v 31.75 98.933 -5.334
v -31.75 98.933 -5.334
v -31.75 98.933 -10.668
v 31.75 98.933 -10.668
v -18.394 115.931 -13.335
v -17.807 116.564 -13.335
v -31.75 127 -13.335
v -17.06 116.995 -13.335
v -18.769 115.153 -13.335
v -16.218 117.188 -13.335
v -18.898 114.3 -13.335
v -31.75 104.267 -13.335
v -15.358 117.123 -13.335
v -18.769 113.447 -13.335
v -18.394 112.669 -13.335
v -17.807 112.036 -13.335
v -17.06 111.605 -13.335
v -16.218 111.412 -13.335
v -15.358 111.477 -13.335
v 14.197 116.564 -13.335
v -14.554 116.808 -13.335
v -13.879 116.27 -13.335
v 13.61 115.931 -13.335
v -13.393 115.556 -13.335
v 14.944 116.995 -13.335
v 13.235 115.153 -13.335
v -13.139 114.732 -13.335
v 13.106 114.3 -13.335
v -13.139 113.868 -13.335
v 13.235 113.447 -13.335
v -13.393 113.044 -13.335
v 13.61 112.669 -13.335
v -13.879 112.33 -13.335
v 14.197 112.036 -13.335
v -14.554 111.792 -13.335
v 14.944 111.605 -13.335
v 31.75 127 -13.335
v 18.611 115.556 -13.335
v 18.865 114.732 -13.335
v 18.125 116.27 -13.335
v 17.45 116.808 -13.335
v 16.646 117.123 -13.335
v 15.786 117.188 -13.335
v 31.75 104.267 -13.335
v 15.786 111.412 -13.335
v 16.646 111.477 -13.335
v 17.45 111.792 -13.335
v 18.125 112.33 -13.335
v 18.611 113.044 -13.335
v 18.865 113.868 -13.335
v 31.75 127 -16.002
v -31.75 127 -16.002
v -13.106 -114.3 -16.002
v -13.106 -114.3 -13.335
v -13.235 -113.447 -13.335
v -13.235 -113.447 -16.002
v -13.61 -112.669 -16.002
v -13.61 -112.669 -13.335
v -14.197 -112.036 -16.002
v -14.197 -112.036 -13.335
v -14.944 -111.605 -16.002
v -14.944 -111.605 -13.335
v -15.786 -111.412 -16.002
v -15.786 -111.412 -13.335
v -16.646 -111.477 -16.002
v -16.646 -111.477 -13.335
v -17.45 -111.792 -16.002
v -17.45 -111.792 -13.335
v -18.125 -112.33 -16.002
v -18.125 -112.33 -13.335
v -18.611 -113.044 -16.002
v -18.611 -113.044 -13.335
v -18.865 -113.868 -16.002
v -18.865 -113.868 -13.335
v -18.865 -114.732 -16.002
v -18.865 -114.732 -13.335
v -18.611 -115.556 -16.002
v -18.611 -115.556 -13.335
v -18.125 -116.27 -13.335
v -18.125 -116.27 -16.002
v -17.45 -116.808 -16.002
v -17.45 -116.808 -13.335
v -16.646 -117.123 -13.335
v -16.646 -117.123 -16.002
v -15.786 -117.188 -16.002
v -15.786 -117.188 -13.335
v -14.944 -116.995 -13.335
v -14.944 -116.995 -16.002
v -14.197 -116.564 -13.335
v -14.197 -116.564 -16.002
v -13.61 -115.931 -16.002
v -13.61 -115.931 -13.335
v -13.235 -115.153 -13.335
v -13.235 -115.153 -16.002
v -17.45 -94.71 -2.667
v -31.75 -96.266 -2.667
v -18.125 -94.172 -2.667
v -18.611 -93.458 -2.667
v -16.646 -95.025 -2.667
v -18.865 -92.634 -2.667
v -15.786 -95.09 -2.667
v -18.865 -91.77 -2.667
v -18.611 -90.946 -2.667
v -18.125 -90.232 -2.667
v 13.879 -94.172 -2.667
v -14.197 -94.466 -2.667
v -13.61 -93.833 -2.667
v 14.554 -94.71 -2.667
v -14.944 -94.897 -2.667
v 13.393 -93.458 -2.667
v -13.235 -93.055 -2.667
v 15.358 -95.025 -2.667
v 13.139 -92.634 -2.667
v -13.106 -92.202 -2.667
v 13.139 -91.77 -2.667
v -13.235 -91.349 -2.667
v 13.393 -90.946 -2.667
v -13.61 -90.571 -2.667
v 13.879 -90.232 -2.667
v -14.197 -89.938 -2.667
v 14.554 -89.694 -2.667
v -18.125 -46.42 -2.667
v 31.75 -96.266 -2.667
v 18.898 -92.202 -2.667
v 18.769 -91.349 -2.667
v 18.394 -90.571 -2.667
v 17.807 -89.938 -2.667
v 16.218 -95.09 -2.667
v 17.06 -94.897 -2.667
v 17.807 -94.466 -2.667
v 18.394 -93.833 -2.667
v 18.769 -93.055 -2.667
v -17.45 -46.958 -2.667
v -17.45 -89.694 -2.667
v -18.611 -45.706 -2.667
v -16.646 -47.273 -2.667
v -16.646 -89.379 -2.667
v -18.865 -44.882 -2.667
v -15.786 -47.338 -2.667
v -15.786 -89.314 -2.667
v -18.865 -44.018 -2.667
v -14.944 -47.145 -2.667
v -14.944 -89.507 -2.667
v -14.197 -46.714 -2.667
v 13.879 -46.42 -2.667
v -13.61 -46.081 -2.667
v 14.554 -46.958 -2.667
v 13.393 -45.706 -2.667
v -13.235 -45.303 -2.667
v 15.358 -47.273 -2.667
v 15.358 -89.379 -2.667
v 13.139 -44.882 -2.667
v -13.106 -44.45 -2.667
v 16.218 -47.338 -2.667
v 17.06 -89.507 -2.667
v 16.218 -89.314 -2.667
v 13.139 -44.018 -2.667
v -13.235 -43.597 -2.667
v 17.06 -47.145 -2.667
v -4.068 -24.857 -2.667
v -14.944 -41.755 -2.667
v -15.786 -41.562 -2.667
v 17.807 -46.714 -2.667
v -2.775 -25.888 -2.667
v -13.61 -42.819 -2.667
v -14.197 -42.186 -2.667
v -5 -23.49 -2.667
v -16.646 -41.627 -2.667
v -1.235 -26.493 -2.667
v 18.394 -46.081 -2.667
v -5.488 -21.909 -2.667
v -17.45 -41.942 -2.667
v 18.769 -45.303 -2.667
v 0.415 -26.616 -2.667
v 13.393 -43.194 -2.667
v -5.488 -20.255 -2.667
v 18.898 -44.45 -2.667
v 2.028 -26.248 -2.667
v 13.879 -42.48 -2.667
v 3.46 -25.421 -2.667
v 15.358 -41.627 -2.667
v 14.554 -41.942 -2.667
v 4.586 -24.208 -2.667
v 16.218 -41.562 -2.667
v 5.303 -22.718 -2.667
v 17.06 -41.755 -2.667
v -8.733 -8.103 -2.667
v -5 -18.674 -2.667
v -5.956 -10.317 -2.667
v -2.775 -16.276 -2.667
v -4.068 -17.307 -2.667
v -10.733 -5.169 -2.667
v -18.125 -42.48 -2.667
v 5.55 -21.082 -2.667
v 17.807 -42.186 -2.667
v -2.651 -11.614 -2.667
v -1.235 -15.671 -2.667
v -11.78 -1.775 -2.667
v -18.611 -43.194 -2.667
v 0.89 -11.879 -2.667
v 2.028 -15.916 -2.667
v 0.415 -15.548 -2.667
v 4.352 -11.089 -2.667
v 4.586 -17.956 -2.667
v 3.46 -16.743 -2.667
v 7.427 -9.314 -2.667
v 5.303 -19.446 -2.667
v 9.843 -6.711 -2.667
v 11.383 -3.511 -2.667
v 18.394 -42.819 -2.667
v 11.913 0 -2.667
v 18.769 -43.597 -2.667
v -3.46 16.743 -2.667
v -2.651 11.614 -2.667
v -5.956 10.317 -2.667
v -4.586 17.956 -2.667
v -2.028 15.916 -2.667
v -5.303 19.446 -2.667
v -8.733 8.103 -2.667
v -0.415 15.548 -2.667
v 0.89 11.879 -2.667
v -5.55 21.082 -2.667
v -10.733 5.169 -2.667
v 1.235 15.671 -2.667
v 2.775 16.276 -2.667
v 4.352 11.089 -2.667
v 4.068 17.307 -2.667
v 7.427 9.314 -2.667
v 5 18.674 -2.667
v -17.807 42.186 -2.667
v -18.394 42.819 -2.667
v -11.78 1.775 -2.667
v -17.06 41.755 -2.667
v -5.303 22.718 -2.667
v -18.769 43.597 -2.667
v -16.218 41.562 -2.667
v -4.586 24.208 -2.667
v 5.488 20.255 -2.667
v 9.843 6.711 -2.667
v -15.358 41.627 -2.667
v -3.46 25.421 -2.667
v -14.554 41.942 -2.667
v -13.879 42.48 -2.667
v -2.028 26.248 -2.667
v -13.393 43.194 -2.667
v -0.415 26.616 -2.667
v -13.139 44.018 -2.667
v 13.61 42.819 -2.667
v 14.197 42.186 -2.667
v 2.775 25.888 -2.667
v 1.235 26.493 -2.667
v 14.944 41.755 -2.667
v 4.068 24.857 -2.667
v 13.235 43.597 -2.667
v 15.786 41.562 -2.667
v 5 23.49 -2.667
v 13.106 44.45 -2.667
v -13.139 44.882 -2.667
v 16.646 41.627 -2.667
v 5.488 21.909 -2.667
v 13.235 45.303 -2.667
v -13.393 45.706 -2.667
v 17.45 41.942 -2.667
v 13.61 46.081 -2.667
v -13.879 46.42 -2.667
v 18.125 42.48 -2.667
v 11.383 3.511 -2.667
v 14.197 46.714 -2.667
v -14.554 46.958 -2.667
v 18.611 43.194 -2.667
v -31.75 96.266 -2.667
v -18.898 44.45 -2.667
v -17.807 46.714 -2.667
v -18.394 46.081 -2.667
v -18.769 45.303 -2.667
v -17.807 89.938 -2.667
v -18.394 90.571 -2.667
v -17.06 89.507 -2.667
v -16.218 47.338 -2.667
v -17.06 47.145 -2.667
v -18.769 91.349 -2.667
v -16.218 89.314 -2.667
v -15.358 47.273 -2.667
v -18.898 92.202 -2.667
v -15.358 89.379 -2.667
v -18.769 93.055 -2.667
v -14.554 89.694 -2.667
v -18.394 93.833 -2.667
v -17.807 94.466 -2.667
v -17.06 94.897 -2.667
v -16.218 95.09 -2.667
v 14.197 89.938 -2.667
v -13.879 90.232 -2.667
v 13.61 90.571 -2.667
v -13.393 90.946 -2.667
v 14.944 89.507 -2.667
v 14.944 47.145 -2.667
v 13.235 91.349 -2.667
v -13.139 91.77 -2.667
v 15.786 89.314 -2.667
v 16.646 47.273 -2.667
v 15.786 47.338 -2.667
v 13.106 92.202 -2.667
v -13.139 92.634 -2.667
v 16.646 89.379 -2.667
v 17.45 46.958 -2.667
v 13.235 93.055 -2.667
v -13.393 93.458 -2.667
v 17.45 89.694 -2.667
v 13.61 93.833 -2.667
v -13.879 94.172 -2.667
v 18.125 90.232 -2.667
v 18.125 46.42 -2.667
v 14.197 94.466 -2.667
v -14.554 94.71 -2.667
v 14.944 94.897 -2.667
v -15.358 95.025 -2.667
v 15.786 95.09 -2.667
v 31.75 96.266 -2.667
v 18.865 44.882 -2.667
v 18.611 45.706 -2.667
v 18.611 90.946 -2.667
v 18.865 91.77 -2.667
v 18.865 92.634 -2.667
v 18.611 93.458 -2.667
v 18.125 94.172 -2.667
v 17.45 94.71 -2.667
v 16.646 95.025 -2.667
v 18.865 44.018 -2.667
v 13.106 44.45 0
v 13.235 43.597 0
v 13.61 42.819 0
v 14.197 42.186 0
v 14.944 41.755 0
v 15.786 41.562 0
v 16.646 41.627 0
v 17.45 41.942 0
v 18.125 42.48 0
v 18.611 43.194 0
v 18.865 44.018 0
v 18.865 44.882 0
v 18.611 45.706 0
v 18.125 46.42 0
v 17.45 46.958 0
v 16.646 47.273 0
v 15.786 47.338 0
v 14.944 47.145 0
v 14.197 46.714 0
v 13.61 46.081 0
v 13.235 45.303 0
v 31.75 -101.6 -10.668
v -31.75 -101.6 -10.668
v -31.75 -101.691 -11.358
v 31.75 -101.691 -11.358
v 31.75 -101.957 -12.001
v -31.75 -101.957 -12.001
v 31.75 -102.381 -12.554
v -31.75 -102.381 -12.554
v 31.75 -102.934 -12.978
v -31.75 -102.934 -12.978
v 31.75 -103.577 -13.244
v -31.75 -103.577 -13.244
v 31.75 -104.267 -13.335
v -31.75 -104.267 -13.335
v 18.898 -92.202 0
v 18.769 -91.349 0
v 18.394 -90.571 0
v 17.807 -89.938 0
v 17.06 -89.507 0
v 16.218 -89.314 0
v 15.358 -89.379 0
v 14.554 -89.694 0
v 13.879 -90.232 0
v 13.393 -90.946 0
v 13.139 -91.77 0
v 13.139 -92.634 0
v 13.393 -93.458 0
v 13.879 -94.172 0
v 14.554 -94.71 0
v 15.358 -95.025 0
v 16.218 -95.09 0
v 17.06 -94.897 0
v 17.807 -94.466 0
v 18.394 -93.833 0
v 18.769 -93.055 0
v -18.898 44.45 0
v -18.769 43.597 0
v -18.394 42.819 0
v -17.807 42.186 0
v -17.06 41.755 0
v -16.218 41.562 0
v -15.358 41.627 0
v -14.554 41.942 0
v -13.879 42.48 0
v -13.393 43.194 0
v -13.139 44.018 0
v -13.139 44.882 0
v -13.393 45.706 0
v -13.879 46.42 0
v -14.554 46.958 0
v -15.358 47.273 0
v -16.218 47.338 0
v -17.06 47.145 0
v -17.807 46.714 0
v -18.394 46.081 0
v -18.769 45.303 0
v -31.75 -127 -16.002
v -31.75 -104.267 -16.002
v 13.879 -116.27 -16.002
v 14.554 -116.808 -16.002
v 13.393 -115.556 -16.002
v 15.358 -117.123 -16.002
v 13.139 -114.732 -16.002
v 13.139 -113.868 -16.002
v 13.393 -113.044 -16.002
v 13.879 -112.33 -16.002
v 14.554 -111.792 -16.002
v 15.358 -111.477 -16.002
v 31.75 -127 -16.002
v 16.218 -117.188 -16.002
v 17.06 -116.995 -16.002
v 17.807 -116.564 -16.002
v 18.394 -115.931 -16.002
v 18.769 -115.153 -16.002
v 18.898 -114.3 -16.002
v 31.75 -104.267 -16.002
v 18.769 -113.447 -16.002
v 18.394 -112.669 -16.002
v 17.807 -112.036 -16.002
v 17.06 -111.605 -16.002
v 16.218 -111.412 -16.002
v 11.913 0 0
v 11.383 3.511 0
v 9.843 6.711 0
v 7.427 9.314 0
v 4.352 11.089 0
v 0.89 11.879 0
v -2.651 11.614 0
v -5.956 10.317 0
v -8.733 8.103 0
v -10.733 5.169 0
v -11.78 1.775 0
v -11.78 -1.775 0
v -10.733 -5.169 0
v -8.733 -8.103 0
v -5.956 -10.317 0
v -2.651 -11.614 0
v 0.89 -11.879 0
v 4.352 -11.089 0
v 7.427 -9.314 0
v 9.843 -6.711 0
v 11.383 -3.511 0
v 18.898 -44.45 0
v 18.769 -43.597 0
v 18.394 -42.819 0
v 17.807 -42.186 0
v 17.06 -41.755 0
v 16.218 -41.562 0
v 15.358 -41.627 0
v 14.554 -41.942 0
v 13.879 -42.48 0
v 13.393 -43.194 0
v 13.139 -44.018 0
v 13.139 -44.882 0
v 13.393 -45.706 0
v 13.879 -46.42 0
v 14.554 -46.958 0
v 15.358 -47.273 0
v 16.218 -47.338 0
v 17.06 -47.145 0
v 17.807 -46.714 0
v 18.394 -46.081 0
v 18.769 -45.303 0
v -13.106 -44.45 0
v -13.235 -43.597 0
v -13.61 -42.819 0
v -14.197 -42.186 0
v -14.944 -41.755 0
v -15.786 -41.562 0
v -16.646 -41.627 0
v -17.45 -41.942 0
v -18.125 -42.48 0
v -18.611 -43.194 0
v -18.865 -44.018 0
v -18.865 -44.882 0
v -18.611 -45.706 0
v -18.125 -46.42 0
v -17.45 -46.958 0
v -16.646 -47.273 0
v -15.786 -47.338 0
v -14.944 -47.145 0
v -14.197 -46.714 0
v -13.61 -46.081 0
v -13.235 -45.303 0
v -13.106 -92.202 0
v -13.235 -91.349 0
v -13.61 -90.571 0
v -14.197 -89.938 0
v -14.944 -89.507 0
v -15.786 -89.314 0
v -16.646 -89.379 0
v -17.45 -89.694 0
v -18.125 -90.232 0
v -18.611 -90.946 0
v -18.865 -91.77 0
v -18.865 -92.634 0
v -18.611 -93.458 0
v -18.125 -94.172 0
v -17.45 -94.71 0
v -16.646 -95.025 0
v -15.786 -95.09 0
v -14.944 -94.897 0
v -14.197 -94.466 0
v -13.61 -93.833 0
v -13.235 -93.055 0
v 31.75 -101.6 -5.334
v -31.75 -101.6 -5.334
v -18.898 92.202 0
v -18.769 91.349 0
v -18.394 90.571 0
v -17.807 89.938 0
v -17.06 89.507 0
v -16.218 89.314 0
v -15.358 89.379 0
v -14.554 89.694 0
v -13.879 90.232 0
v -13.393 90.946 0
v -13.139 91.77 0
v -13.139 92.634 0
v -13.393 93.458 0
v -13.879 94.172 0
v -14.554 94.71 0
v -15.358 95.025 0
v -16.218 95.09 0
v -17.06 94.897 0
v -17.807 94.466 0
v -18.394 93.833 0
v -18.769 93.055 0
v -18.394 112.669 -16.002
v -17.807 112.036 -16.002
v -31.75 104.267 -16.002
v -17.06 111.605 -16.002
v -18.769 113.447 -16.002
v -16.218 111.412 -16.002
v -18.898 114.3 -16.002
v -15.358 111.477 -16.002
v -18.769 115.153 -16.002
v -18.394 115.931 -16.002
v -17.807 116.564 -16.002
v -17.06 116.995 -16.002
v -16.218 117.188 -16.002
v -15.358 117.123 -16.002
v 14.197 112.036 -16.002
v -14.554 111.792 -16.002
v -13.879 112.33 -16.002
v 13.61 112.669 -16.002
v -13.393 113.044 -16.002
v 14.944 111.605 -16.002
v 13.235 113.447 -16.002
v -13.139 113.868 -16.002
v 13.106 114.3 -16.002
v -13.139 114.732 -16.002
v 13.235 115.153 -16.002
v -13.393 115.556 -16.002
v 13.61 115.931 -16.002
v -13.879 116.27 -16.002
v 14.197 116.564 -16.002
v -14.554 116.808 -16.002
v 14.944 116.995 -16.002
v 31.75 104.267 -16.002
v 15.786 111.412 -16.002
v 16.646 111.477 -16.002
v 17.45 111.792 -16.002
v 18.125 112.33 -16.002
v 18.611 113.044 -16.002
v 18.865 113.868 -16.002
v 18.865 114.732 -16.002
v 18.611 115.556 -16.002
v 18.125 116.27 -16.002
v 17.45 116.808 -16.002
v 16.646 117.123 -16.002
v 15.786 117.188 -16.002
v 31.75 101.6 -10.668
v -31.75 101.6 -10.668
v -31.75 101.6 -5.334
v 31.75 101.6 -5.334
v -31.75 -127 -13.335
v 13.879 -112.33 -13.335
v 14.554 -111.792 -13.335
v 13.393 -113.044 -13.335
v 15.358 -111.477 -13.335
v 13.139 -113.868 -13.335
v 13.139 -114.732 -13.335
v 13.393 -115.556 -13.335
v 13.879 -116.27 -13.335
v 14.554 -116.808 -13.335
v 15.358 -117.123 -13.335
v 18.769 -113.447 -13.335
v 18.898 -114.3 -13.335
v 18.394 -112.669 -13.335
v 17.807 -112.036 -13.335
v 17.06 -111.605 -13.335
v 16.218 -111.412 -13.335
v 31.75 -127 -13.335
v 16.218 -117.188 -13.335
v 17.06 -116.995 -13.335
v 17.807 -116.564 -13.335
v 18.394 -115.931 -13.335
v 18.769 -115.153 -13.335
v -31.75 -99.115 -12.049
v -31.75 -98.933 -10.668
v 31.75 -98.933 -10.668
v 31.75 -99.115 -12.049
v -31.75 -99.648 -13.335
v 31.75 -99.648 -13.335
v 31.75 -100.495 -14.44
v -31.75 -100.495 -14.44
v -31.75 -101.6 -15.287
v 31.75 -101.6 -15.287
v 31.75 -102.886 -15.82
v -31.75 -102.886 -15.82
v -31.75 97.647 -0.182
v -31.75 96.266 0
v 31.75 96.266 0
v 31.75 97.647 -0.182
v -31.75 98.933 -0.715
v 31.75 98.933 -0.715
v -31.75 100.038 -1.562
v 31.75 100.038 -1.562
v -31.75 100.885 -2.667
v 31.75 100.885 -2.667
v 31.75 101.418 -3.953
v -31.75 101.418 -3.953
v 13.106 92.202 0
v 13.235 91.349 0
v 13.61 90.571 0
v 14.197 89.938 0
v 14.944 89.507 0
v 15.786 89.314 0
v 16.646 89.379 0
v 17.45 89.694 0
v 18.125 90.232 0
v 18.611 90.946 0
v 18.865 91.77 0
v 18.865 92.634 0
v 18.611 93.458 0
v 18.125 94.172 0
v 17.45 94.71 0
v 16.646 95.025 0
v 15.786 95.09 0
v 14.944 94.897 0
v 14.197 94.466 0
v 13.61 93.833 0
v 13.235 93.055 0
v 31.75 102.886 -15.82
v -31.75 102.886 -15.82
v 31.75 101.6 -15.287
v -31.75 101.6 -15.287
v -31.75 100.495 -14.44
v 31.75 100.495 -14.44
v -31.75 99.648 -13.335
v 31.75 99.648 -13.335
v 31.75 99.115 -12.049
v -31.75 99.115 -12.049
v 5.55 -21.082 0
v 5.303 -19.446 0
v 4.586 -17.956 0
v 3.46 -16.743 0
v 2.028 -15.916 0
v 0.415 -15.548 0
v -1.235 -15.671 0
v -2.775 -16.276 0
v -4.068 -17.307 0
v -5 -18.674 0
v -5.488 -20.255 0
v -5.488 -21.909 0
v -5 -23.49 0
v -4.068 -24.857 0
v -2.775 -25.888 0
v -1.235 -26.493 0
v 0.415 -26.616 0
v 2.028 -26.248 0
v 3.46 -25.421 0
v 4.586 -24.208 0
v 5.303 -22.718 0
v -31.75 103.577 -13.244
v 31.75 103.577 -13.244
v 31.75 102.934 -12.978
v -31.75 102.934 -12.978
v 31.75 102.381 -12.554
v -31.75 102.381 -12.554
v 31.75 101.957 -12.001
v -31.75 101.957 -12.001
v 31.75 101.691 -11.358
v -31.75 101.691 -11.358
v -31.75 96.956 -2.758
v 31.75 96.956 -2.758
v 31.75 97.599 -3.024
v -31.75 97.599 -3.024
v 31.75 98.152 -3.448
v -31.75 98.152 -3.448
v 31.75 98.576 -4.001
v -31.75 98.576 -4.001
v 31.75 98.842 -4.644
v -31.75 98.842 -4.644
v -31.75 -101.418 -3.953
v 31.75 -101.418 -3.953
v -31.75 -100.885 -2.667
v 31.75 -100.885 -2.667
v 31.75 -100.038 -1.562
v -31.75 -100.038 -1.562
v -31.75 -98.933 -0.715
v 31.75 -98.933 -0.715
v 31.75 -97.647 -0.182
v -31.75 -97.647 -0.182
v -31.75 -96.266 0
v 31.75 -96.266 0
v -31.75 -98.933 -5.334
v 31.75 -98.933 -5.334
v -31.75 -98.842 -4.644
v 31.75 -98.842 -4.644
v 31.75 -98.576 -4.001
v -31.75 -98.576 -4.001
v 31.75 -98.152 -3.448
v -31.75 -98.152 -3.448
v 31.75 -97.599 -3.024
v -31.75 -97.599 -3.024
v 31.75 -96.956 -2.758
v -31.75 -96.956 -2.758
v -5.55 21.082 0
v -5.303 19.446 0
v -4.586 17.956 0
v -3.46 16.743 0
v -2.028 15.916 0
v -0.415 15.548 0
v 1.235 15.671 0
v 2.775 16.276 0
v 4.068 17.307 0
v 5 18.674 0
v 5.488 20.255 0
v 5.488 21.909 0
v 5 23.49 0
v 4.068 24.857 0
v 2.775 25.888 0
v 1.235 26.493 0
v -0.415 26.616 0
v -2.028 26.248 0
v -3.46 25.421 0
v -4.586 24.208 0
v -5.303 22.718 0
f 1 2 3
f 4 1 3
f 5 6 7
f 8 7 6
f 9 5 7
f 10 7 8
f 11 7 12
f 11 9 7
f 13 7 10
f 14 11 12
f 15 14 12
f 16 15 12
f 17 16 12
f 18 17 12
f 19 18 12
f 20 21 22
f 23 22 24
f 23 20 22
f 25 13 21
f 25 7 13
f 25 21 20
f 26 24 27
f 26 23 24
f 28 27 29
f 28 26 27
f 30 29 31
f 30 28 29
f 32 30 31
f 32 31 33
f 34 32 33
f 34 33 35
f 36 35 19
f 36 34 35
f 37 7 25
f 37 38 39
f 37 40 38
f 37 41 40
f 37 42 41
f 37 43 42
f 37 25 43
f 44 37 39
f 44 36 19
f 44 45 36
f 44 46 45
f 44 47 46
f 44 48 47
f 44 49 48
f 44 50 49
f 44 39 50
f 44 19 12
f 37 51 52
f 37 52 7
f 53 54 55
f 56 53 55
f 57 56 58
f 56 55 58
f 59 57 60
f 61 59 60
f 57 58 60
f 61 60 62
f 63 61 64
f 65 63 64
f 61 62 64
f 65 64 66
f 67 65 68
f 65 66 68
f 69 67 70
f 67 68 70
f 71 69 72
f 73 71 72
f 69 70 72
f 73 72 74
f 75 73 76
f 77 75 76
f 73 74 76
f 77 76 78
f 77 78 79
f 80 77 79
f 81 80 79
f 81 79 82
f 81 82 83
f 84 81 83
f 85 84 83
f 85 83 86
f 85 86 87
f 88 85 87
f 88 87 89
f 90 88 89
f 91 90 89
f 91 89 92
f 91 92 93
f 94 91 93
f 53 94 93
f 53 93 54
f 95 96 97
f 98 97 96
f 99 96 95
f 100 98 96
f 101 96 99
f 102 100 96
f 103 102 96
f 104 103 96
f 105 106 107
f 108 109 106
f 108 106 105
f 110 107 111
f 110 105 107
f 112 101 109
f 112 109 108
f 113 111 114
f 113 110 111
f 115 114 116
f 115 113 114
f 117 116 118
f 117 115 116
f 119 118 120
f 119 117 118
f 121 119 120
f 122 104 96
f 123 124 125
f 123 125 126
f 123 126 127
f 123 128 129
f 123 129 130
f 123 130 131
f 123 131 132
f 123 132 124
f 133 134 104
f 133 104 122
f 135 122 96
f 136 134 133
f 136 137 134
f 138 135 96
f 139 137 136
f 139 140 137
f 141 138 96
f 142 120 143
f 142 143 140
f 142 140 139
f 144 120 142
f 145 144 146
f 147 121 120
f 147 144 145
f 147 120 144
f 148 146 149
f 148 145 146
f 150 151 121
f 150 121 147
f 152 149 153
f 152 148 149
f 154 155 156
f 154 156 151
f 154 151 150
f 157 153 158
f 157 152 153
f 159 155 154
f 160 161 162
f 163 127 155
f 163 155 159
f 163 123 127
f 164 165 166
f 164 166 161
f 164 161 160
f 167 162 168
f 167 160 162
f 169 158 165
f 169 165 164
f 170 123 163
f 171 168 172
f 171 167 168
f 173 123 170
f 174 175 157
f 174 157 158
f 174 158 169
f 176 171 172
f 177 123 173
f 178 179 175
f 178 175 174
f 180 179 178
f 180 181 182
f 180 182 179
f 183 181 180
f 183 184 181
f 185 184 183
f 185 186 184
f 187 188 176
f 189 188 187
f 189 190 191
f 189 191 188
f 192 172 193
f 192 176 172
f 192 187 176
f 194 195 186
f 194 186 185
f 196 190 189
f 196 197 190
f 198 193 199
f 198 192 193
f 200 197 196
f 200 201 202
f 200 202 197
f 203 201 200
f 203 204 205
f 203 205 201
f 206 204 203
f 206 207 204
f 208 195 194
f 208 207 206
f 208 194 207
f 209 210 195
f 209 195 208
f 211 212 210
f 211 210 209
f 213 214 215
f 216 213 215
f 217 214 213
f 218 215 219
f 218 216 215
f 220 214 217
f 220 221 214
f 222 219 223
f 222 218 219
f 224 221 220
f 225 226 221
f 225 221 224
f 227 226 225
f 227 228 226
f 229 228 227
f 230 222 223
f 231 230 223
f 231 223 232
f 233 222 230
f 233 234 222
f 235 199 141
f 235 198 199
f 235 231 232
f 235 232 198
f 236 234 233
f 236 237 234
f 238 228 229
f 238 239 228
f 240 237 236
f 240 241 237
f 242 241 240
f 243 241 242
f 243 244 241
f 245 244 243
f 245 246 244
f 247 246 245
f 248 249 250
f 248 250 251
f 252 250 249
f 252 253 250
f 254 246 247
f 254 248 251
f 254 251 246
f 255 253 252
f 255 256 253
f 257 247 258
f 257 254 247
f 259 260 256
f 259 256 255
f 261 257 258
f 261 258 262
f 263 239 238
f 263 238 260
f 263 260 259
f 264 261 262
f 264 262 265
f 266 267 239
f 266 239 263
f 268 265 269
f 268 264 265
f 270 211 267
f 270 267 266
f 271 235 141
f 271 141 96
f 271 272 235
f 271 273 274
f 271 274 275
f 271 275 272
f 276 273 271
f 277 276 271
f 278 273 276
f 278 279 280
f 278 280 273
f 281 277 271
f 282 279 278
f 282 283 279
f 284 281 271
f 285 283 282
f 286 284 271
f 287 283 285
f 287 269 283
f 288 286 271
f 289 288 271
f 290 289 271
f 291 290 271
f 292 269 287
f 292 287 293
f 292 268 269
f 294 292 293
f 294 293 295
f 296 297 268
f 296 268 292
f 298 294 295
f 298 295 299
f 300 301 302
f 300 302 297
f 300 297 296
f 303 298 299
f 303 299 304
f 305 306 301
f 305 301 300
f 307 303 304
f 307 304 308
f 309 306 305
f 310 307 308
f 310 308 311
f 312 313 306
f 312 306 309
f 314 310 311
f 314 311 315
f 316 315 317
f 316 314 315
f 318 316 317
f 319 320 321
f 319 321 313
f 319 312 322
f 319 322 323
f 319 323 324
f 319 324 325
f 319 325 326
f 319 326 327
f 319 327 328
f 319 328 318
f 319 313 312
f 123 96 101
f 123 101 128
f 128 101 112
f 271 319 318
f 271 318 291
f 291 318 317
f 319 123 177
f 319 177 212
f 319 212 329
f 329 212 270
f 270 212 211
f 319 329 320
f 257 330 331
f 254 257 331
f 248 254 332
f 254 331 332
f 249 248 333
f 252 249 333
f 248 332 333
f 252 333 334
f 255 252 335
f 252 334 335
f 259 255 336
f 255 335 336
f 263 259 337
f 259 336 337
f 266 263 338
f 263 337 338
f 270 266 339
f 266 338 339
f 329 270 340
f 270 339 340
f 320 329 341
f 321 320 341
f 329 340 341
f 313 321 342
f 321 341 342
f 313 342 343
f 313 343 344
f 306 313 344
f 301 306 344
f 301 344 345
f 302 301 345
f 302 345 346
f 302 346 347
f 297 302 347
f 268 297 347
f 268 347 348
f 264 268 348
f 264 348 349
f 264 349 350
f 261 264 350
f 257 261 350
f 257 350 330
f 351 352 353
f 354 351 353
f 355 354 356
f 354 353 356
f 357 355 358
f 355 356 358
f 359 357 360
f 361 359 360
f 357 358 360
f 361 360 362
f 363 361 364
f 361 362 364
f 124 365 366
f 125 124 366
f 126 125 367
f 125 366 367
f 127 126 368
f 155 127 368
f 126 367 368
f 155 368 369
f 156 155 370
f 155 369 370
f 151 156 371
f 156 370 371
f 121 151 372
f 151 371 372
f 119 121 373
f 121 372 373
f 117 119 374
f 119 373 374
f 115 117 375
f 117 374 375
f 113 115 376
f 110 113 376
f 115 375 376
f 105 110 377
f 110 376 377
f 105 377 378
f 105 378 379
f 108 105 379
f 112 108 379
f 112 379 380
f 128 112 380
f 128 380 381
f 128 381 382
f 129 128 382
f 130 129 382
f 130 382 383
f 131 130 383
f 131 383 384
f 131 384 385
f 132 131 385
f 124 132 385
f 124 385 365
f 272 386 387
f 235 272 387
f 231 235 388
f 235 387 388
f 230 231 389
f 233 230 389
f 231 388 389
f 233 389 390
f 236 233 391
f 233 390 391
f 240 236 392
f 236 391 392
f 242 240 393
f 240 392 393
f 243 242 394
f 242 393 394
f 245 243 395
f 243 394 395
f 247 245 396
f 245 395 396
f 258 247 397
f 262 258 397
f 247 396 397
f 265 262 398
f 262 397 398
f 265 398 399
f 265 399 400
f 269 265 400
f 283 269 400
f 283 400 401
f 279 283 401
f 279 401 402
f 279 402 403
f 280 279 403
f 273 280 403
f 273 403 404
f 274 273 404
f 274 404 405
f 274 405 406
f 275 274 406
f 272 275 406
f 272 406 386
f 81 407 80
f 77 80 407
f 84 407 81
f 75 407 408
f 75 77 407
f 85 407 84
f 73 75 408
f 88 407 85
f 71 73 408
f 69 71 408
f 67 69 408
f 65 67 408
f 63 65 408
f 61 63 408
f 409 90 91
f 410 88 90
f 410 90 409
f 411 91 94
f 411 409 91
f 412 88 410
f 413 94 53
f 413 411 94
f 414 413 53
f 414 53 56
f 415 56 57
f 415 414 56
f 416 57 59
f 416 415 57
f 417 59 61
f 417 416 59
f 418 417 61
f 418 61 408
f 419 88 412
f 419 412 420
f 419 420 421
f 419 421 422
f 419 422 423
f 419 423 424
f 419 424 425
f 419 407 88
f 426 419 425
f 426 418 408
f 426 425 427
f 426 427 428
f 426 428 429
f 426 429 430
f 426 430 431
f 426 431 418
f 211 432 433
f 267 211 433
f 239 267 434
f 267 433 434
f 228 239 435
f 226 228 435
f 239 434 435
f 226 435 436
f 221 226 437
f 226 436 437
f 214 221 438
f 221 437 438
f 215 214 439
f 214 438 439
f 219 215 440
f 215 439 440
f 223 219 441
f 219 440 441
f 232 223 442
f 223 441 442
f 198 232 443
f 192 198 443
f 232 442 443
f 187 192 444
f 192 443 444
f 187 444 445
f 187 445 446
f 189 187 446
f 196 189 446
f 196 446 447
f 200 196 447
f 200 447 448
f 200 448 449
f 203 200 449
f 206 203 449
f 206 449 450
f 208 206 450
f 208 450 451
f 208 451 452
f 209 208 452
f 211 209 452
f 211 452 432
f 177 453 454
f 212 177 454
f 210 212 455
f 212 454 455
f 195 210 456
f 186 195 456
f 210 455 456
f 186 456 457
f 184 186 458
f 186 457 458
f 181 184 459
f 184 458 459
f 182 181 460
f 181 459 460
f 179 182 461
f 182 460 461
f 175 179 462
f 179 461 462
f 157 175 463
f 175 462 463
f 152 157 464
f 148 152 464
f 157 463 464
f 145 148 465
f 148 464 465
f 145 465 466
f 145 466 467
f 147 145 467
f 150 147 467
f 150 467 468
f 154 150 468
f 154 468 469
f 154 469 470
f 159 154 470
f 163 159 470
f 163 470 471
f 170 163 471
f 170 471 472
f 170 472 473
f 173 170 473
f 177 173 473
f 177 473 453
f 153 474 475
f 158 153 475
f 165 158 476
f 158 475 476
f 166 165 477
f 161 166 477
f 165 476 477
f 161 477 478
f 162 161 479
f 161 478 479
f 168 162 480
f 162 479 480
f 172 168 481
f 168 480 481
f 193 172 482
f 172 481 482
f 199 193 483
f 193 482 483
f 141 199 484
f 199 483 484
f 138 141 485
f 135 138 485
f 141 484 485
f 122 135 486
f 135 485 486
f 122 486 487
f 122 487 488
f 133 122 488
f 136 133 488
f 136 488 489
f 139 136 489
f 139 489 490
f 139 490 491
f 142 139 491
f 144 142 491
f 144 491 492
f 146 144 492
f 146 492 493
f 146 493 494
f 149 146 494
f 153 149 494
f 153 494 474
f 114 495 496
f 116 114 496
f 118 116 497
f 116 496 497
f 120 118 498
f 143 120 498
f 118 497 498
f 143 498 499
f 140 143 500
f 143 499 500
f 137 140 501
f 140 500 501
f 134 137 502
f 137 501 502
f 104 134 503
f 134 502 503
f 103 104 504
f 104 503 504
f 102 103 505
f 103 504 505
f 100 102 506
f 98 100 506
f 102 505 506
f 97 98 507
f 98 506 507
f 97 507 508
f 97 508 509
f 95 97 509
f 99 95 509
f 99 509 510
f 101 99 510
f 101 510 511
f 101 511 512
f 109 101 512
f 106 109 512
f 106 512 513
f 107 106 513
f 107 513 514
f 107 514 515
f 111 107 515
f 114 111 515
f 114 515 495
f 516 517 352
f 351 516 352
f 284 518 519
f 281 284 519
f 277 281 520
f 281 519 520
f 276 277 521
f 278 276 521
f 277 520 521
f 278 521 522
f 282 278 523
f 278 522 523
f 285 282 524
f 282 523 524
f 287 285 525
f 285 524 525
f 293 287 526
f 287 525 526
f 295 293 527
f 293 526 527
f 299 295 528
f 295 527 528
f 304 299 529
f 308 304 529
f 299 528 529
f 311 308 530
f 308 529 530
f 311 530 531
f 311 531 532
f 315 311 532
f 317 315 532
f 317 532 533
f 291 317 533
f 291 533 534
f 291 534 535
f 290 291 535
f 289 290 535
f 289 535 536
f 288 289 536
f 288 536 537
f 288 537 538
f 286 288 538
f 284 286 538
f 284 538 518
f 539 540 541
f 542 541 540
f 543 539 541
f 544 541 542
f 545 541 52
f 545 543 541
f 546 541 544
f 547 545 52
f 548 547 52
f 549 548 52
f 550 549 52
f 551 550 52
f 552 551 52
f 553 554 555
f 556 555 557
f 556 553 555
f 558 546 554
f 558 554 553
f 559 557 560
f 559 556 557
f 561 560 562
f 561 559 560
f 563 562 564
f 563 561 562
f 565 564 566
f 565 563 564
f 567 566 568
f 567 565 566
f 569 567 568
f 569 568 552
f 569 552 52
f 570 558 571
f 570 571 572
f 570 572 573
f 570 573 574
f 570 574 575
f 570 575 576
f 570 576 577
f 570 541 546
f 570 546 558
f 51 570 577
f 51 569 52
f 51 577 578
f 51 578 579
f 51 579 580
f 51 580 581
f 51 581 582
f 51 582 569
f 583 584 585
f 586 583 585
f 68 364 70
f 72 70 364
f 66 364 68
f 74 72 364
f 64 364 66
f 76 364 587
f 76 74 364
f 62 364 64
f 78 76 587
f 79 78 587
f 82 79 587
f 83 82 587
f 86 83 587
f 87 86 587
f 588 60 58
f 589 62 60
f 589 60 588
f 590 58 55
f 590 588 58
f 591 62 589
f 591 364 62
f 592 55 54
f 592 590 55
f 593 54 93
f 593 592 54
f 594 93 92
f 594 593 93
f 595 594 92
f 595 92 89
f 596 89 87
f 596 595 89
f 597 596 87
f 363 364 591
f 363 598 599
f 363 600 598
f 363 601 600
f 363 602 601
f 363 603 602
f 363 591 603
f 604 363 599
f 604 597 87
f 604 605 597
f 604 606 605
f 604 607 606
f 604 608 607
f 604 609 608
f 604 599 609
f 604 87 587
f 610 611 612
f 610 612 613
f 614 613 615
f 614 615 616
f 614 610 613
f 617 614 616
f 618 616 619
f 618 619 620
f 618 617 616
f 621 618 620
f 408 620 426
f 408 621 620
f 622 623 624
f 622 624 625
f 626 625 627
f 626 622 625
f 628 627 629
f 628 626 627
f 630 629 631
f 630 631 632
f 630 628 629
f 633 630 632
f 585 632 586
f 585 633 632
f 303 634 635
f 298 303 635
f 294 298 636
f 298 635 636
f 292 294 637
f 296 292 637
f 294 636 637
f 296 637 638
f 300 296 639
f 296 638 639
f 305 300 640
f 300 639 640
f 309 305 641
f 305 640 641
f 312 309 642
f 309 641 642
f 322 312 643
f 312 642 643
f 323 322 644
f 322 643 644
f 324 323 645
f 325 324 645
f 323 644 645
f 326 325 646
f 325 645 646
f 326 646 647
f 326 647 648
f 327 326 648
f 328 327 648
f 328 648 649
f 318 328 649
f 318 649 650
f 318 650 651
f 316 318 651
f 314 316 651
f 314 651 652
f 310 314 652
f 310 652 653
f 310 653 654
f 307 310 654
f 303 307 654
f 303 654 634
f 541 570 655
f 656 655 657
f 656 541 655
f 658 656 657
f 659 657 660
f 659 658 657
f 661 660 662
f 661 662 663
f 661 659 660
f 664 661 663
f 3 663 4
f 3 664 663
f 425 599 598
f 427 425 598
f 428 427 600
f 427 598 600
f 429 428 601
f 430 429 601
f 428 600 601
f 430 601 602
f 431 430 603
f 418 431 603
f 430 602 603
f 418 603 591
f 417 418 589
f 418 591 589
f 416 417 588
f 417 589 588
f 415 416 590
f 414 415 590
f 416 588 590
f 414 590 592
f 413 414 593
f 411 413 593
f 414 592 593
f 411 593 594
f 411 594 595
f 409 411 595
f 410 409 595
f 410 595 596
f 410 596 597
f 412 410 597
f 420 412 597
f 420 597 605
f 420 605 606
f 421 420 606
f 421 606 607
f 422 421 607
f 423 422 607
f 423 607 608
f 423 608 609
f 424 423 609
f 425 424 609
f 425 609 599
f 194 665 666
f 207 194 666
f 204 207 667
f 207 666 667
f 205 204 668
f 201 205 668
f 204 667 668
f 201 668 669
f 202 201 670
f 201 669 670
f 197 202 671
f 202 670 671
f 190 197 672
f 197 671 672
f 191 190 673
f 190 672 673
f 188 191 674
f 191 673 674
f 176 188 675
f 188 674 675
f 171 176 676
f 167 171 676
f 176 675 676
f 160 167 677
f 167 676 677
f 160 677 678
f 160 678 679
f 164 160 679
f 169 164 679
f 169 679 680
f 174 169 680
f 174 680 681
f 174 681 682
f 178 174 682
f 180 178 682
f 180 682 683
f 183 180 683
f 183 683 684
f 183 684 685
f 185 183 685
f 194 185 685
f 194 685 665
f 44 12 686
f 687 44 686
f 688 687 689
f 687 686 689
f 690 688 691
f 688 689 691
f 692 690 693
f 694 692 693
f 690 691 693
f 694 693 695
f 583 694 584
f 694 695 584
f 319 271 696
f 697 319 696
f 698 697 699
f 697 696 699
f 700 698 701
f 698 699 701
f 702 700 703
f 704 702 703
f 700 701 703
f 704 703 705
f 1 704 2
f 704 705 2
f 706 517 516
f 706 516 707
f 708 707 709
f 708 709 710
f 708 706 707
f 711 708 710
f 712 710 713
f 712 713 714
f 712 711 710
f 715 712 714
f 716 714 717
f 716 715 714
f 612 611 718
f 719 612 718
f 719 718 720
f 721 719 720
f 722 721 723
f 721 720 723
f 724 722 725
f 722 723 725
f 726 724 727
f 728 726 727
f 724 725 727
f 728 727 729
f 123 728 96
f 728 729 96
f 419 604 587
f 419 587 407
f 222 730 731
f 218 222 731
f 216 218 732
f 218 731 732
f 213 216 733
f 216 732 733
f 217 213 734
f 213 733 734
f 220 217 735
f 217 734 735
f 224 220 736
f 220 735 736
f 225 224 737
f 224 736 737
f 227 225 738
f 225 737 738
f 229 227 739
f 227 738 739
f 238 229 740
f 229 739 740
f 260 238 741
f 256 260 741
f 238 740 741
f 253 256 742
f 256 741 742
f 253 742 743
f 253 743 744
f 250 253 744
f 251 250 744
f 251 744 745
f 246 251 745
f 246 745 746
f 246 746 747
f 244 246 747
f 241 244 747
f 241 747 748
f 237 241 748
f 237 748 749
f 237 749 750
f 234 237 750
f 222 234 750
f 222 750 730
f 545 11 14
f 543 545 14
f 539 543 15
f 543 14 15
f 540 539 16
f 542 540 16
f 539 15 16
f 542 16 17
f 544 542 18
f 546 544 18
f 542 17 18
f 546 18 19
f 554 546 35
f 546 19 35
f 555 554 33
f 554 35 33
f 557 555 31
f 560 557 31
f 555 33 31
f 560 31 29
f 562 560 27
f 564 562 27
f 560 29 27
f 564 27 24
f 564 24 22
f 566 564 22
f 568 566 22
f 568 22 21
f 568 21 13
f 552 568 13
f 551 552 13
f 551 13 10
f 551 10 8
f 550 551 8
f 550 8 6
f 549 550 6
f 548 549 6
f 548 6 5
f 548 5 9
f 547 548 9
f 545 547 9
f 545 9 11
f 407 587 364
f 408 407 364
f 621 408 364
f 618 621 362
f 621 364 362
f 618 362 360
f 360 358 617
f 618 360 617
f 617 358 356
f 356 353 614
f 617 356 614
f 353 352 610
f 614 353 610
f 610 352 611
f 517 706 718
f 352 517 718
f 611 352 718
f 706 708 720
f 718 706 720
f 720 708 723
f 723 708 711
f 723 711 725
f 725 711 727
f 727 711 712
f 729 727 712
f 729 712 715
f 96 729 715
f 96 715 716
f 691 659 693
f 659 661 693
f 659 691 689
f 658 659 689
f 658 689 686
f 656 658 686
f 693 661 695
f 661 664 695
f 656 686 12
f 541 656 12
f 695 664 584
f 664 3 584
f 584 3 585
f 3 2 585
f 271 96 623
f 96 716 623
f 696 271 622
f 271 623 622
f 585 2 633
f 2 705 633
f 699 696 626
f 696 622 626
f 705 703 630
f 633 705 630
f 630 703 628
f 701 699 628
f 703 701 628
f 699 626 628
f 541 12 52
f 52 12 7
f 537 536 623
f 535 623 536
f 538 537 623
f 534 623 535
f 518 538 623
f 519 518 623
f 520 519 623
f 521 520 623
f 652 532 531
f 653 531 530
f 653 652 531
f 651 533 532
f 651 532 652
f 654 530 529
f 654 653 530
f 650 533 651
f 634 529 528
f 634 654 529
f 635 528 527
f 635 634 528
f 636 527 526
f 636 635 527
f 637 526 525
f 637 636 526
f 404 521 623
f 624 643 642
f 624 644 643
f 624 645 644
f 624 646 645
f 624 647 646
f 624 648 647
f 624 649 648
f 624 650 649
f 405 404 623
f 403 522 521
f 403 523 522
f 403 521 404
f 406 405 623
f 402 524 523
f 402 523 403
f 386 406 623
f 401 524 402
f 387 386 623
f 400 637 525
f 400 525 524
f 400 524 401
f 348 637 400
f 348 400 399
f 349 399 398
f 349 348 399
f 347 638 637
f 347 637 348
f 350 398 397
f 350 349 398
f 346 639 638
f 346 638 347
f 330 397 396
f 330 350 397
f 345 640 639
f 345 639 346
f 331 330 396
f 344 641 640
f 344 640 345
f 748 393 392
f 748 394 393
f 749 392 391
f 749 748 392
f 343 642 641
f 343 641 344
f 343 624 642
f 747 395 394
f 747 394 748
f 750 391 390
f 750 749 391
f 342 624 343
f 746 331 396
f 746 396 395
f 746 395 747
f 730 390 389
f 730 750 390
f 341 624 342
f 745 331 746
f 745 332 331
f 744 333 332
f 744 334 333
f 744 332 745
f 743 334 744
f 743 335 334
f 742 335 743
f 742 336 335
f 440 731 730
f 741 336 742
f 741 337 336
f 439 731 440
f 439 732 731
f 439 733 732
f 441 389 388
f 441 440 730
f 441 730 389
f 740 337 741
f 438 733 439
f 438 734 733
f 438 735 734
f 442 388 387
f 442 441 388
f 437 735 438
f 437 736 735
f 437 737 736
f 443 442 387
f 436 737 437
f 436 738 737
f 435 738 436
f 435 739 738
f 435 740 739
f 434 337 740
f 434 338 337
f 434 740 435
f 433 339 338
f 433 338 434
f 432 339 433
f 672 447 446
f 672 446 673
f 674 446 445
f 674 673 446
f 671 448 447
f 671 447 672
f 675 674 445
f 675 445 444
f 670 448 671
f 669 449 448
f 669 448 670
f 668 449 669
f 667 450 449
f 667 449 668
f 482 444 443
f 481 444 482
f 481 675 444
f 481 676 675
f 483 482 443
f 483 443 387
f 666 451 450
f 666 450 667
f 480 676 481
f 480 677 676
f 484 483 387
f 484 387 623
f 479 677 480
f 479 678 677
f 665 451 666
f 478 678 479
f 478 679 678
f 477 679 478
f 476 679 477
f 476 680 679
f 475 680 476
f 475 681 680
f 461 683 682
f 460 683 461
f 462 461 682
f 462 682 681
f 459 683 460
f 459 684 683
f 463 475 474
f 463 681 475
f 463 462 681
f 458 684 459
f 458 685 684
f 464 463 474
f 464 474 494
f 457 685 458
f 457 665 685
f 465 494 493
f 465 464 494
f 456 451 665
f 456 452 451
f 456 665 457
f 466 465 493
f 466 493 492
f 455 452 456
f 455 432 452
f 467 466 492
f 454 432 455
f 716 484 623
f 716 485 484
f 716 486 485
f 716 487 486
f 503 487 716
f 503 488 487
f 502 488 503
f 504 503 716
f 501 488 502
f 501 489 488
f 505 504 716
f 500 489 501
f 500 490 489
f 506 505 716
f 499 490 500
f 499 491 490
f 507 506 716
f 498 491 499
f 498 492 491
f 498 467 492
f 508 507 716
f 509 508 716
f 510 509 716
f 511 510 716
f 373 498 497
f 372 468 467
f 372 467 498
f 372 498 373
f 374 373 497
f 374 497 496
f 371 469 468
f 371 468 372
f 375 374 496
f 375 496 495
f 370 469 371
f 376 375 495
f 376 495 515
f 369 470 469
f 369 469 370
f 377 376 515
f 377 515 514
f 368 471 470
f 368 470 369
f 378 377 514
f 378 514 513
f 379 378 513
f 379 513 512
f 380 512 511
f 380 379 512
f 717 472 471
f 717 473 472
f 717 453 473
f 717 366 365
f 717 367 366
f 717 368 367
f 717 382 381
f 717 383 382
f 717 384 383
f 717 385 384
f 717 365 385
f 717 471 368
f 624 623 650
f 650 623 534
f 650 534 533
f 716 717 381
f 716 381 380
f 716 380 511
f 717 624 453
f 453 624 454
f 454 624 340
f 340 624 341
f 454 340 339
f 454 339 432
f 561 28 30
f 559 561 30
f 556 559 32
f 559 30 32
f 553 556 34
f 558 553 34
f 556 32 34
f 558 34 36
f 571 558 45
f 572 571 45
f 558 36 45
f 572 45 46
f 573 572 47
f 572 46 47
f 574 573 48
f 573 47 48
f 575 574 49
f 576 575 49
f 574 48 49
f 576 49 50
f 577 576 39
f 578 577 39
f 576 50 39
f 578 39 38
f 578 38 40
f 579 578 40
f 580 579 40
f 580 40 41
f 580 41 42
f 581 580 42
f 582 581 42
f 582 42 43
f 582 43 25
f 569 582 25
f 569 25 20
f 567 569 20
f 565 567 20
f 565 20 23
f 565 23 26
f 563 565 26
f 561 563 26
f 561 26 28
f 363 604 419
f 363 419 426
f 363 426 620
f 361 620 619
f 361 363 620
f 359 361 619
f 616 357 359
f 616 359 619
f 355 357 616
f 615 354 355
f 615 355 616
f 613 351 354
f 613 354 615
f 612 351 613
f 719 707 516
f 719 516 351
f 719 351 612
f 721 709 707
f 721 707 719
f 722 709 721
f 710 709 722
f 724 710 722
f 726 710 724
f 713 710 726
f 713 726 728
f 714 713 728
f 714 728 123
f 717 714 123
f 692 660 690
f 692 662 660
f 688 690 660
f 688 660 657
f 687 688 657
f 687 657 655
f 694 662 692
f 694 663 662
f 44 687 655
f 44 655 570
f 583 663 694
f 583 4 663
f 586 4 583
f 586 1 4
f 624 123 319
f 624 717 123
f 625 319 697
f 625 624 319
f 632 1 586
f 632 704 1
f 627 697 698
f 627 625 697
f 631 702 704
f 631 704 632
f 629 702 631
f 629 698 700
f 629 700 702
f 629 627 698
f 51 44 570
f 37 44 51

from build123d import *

# Parameters (mm, degrees)
SALIENTE_EXTRUIR1_DEPTH   = 31.75
CONVERTIR_S_LIDO1_START   = -31.75
CONVERTIR_S_LIDO1_DEPTH   = 63.5
CONVERTIR_S_LIDO1_2_DEPTH = 63.5
CROQUIS7_R                = 2.8956
CROQUIS7_R_2              = 5.5499
CROQUIS7_R_3              = 11.9126
CORTAR_EXTRUIR1_DEPTH     = 132.88300309


# Read off the part's stored shape, not the designer's step: Convertir-Sólido1
with BuildPart() as part:
    # Croquis2 → Saliente-Extruir1 (new, symmetric)
    with BuildSketch(Plane(origin=(0, 0, 0), x_dir=(0, 0, -1), z_dir=(1, 0, 0))):
        Polygon((0, 101.6), (0, -101.6), (13.335, -101.6), (13.335, -127), (16.002, -127), (16.002, -98.933), (2.667, -98.933), (2.667, 98.933), (16.002, 98.933), (16.002, 127), (13.335, 127), (13.335, 101.6), align=None)
    extrude(amount=SALIENTE_EXTRUIR1_DEPTH, both=True)

    # Convertir-Sólido1 outline → Convertir-Sólido1 (cut)
    with BuildSketch(Plane.YZ.offset(CONVERTIR_S_LIDO1_START)):
        with BuildLine():
            Line((101.6, 0), (96.266, 0))
            ThreePointArc((96.266, 0), (100.037707571, -1.562292429), (101.6, -5.334))
            Line((101.6, -5.334), (101.6, 0))
        make_face()
        with BuildLine():
            Line((-101.6, 0), (-101.6, -5.334))
            ThreePointArc((-101.6, -5.334), (-100.037707571, -1.562292429), (-96.266, 0))
            Line((-96.266, 0), (-101.6, 0))
        make_face()
        with BuildLine():
            ThreePointArc((104.267, -16.002), (100.495292429, -14.439707571), (98.933, -10.668))
            Line((98.933, -10.668), (98.933, -16.002))
            Line((98.933, -16.002), (104.267, -16.002))
        make_face()
        with BuildLine():
            ThreePointArc((-98.933, -10.668), (-100.495292429, -14.439707571), (-104.267, -16.002))
            Line((-104.267, -16.002), (-98.933, -16.002))
            Line((-98.933, -16.002), (-98.933, -10.668))
        make_face()
    extrude(amount=CONVERTIR_S_LIDO1_DEPTH, mode=Mode.SUBTRACT)

    # Convertir-S_lido1 2 outline → Convertir-S_lido1 2 (add)
    with BuildSketch(Plane.YZ.offset(CONVERTIR_S_LIDO1_START)):
        with BuildLine():
            ThreePointArc((104.267, -13.335), (102.381146215, -12.553853785), (101.6, -10.668))
            Line((101.6, -10.668), (101.6, -13.335))
            Line((101.6, -13.335), (104.267, -13.335))
        make_face()
        with BuildLine():
            ThreePointArc((-101.6, -10.668), (-102.381146215, -12.553853785), (-104.267, -13.335))
            Line((-104.267, -13.335), (-101.6, -13.335))
            Line((-101.6, -13.335), (-101.6, -10.668))
        make_face()
        with BuildLine():
            Line((98.933, -2.667), (96.266, -2.667))
            ThreePointArc((96.266, -2.667), (98.151853785, -3.448146215), (98.933, -5.334))
            Line((98.933, -5.334), (98.933, -2.667))
        make_face()
        with BuildLine():
            Line((-98.933, -2.667), (-98.933, -5.334))
            ThreePointArc((-98.933, -5.334), (-98.151853785, -3.448146215), (-96.266, -2.667))
            Line((-96.266, -2.667), (-98.933, -2.667))
        make_face()
    extrude(amount=CONVERTIR_S_LIDO1_2_DEPTH)

    # Croquis7 → Cortar-Extruir1 (cut, through all)
    with BuildSketch(Plane.XY):
        with Locations((-16.002, -114.3)):
            Circle(CROQUIS7_R)
        with Locations((16.002, -114.3)):
            Circle(CROQUIS7_R)
        with Locations((-16.002, -92.202)):
            Circle(CROQUIS7_R)
        with Locations((16.002, -92.202)):
            Circle(CROQUIS7_R)
        with Locations((-16.002, -44.45)):
            Circle(CROQUIS7_R)
        with Locations((16.002, -44.45)):
            Circle(CROQUIS7_R)
        with Locations((0, -21.082)):
            Circle(CROQUIS7_R_2)
        Circle(CROQUIS7_R_3)
        with Locations(Location((0, 21.082, 0), (0, 0, 180))):
            Circle(CROQUIS7_R_2)
        with Locations(Location((16.002, 44.45, 0), (0, 0, 180))):
            Circle(CROQUIS7_R)
        with Locations(Location((-16.002, 44.45, 0), (0, 0, 180))):
            Circle(CROQUIS7_R)
        with Locations(Location((16.002, 92.202, 0), (0, 0, 180))):
            Circle(CROQUIS7_R)
        with Locations(Location((-16.002, 92.202, 0), (0, 0, 180))):
            Circle(CROQUIS7_R)
        with Locations(Location((16.002, 114.3, 0), (0, 0, 180))):
            Circle(CROQUIS7_R)
        with Locations(Location((-16.002, 114.3, 0), (0, 0, 180))):
            Circle(CROQUIS7_R)
    extrude(amount=-CORTAR_EXTRUIR1_DEPTH, mode=Mode.SUBTRACT)


solid = part.part
